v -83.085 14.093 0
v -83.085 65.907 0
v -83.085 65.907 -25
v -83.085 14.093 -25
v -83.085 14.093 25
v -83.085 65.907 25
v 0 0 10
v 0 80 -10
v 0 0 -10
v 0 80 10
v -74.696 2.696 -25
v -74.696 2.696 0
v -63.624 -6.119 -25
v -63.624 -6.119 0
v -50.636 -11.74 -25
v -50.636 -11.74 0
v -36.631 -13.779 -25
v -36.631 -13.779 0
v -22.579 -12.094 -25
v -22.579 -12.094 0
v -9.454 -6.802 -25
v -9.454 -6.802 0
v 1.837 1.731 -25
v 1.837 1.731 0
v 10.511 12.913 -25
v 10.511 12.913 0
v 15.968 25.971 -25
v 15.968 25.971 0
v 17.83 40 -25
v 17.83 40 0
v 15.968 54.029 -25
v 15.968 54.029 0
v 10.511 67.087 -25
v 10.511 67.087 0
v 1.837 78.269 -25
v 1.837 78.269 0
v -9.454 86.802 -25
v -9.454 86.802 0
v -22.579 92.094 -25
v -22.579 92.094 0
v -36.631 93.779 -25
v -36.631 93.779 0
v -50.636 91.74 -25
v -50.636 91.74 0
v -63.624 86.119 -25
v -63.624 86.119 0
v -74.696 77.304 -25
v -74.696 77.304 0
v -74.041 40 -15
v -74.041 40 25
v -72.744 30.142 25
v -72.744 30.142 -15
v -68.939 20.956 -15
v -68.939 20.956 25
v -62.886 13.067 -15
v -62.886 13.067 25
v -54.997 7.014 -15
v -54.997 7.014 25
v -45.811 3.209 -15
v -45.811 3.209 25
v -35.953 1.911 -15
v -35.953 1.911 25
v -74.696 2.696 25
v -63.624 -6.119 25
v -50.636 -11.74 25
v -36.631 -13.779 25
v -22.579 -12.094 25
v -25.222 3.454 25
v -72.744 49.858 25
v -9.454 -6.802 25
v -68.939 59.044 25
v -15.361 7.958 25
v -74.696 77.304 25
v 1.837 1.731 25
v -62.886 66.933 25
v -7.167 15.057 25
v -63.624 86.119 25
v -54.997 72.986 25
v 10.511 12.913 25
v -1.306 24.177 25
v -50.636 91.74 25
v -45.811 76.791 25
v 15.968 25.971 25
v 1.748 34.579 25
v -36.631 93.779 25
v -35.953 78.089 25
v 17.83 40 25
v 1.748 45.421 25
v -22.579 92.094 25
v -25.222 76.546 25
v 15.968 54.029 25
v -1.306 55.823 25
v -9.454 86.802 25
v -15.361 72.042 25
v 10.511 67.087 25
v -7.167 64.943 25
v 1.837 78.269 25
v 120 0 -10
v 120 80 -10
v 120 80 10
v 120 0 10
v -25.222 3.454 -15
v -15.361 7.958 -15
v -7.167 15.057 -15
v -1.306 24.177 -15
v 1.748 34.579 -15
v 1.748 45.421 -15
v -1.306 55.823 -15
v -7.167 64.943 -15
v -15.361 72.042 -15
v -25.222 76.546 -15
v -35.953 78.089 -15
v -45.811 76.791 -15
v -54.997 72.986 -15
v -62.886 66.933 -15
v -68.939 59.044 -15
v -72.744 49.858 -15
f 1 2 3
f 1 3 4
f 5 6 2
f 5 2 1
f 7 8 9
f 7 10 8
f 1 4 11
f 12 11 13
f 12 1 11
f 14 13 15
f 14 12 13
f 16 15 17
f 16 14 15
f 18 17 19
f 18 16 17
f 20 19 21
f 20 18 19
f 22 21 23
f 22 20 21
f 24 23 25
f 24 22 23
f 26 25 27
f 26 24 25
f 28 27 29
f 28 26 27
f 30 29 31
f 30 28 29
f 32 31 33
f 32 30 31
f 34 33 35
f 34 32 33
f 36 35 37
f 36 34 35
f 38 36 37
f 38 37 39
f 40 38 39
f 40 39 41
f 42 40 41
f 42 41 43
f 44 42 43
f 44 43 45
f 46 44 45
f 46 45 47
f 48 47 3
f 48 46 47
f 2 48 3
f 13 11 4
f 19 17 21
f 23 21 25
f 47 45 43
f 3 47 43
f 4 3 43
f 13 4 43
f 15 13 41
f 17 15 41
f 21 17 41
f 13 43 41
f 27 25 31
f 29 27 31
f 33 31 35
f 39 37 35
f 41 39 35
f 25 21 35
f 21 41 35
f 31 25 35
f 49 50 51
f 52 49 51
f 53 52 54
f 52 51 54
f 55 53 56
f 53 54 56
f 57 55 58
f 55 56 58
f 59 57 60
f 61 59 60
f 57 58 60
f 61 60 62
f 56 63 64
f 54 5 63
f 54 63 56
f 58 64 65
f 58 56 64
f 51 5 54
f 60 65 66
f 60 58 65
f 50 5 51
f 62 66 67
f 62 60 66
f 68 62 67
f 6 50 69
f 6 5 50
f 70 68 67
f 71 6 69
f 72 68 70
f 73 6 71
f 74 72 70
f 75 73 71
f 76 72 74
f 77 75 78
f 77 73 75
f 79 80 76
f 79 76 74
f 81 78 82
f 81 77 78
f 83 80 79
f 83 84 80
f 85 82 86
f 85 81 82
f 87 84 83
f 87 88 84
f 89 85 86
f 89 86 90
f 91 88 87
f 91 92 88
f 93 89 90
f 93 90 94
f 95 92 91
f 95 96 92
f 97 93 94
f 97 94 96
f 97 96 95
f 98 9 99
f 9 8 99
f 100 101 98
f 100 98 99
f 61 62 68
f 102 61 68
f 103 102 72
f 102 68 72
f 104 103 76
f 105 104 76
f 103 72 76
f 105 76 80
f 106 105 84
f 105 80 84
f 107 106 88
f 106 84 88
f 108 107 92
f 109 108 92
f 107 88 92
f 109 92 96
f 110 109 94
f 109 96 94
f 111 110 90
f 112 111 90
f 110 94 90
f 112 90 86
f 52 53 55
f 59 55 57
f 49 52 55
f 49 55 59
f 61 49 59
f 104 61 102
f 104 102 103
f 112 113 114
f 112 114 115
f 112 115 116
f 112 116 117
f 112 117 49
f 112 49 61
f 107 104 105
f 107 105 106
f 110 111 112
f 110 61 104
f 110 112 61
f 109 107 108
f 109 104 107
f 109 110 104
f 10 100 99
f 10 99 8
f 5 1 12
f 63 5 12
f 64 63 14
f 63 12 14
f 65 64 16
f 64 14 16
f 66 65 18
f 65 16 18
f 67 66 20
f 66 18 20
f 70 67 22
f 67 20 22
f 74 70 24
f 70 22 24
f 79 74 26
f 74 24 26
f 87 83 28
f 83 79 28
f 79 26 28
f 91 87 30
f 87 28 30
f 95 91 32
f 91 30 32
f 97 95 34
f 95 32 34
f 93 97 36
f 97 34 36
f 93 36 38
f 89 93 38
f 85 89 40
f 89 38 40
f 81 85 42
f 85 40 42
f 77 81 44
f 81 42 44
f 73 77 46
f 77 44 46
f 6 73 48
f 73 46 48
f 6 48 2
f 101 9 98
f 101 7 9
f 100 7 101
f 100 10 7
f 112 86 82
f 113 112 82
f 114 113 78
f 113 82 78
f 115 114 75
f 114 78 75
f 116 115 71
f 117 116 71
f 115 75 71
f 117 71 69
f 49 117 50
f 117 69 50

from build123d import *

# Parameters (mm, degrees)
F1_DEPTH      = 25
F1_DEPTH_BACK = 25
F2_DEPTH      = 10
F2_DEPTH_BACK = 10
F4_DEPTH      = 40


with BuildPart() as f1:
    # F0 (on Top) → F1 (new body, two sides)
    with BuildSketch(Plane.XY) as f1_sk:
        with BuildLine():
            ThreePointArc((-83.0851361962, 14.0932304172), (-44.9472909192, -13.0255649041), (0, 0))
            Line((0, 0), (0, 80))
            ThreePointArc((0, 80), (-44.9472909192, 93.0255649041), (-83.0851361962, 65.9067695828))
            Line((-83.0851361962, 65.9067695828), (-83.0851361962, 14.0932304172))
        make_face()
        with BuildLine():
            Line((0, 80), (0, 0))
            ThreePointArc((0, 0), (13.1707529219, 18.1030103156), (17.8301045695, 40))
            ThreePointArc((17.8301045695, 40), (13.1707529219, 61.8969896844), (0, 80))
        make_face()
    extrude(amount=F1_DEPTH)
    extrude(f1_sk.sketch, amount=-F1_DEPTH_BACK)

    # F3 (on face) → F4 (cut)
    with BuildSketch(Plane.XY.offset(25)):
        with BuildLine():
            ThreePointArc((2.1356884389, 40), (-9.0201962122, 66.9326880249), (-35.952884237, 78.0885726759))
            Line((-35.952884237, 78.0885726759), (-35.952884237, 40))
            Line((-35.952884237, 40), (2.1356884389, 40))
        make_face()
        with BuildLine():
            Line((-35.952884237, 40), (-35.952884237, 78.0885726759))
            ThreePointArc((-35.952884237, 78.0885726759), (-62.8855722619, 66.9326880249), (-74.0414569129, 40))
            Line((-74.0414569129, 40), (-35.952884237, 40))
        make_face()
        with BuildLine():
            Line((2.1356884389, 40), (-35.952884237, 40))
            Line((-35.952884237, 40), (-35.952884237, 1.9114273241))
            ThreePointArc((-35.952884237, 1.9114273241), (-9.0201962122, 13.0673119751), (2.1356884389, 40))
        make_face()
        with BuildLine():
            Line((-35.952884237, 1.9114273241), (-35.952884237, 40))
            Line((-35.952884237, 40), (-74.0414569129, 40))
            ThreePointArc((-74.0414569129, 40), (-62.8855722619, 13.0673119751), (-35.952884237, 1.9114273241))
        make_face()
    extrude(amount=-F4_DEPTH, mode=Mode.SUBTRACT)


with BuildPart() as f2:
    # F0 (on Top) → F2 (new body, two sides)
    with BuildSketch(Plane.XY) as f2_sk:
        with BuildLine():
            ThreePointArc((17.8301045695, 40), (13.1707529219, 18.1030103156), (0, 0))
            Line((0, 0), (120, 0))
            Line((120, 0), (120, 80))
            Line((120, 80), (0, 80))
            ThreePointArc((0, 80), (13.1707529219, 61.8969896844), (17.8301045695, 40))
        make_face()
        with BuildLine():
            Line((0, 80), (0, 0))
            ThreePointArc((0, 0), (13.1707529219, 18.1030103156), (17.8301045695, 40))
            ThreePointArc((17.8301045695, 40), (13.1707529219, 61.8969896844), (0, 80))
        make_face()
    extrude(amount=F2_DEPTH)
    extrude(f2_sk.sketch, amount=-F2_DEPTH_BACK)


solid = Compound([f1.part, f2.part])
